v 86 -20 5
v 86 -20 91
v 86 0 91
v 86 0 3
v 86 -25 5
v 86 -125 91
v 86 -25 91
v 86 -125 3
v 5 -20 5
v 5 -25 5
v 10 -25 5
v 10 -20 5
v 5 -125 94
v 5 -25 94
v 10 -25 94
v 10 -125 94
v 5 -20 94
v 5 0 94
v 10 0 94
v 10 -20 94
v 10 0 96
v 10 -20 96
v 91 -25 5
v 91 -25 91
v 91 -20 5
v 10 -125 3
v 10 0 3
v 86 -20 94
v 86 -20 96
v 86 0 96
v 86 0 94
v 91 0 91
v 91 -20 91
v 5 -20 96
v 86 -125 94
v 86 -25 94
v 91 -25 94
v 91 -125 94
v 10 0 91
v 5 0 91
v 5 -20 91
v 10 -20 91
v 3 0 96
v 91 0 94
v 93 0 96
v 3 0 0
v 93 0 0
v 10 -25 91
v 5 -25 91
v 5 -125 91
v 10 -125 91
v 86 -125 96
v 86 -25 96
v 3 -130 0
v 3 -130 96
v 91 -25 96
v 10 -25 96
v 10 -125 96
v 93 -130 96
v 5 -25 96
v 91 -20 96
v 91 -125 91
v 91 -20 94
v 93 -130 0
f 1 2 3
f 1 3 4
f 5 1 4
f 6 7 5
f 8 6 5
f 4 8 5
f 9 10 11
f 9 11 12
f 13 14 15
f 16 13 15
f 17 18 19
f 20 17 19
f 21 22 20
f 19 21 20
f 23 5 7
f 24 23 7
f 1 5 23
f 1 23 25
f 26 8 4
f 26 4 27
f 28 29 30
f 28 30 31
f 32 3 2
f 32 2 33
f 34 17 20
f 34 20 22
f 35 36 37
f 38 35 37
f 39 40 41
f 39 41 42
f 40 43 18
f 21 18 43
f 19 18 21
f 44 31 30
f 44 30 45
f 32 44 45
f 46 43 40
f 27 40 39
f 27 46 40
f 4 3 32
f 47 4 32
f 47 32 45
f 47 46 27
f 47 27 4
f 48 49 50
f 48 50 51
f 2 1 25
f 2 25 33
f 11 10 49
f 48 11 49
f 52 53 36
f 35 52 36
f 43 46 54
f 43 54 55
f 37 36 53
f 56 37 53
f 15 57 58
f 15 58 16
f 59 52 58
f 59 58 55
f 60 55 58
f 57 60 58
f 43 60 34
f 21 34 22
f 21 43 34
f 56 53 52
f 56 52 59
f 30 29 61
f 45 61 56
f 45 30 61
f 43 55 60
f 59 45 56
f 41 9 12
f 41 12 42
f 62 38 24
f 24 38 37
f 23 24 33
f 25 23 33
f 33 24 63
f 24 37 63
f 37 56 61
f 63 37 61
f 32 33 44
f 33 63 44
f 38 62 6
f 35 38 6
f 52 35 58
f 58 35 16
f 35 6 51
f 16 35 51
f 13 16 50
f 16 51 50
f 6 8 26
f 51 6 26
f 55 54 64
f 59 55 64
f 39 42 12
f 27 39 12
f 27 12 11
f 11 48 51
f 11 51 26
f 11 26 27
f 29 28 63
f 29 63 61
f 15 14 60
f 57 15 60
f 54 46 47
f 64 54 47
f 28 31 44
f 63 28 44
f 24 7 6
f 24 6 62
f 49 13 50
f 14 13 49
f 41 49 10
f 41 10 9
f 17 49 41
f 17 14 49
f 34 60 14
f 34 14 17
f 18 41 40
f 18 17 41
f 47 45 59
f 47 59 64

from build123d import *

# Parameters (mm, degrees)
SKETCH_1_W           = 96
SKETCH_1_H           = 130
EXTRUDE_1_DEPTH      = 96
SKETCH_3_W           = 76
SKETCH_3_H           = 93
CUT_EXTRUDE_1_DEPTH  = 130
SKETCH_8_W           = 86
SKETCH_8_H           = 125
CUT_EXTRUDE_5_DEPTH  = 3
SKETCH_10_W          = 91
SKETCH_10_H          = 5
CUT_EXTRUDE_7_DEPTH  = 86
SKETCH_15_W          = 96
SKETCH_15_H          = 130
CUT_EXTRUDE_10_DEPTH = 3
SKETCH_16_W          = 96
SKETCH_16_H          = 130
CUT_EXTRUDE_11_DEPTH = 3


with BuildPart() as part:
    # 草圖1 → 填料-伸長1 (new body)
    with BuildSketch(Plane.XY):
        with Locations((48, -65)):
            Rectangle(SKETCH_1_W, SKETCH_1_H)
    extrude(amount=EXTRUDE_1_DEPTH)

    # 草圖3 → 除料-伸長1 (cut)
    with BuildSketch(Plane(origin=(0, -125, 0), x_dir=(-1, 0, 0), z_dir=(0, -1, 0))):
        with Locations((-48, -49.5)):
            Rectangle(SKETCH_3_W, SKETCH_3_H)
    extrude(amount=-CUT_EXTRUDE_1_DEPTH, mode=Mode.SUBTRACT)

    # 草圖8 → 除料-伸長5 (cut)
    with BuildSketch(Plane.XY.offset(94)):
        with Locations((48, -62.5)):
            Rectangle(SKETCH_8_W, SKETCH_8_H)
    extrude(amount=-CUT_EXTRUDE_5_DEPTH, mode=Mode.SUBTRACT)

    # 草圖10 → 除料-伸長7 (cut)
    with BuildSketch(Plane.ZY.offset(-5)):
        with Locations((50.5, -22.5)):
            Rectangle(SKETCH_10_W, SKETCH_10_H)
    extrude(amount=-CUT_EXTRUDE_7_DEPTH, mode=Mode.SUBTRACT)

    # 草圖15 → 除料-伸長10 (cut)
    with BuildSketch(Plane.ZY):
        with Locations((48, -65)):
            Rectangle(SKETCH_15_W, SKETCH_15_H)
    extrude(amount=-CUT_EXTRUDE_10_DEPTH, mode=Mode.SUBTRACT)

    # 草圖16 → 除料-伸長11 (cut)
    with BuildSketch(Plane(origin=(96, 0, 0), x_dir=(0, 0, -1), z_dir=(1, 0, 0))):
        with Locations((-48, -65)):
            Rectangle(SKETCH_16_W, SKETCH_16_H)
    extrude(amount=-CUT_EXTRUDE_11_DEPTH, mode=Mode.SUBTRACT)


solid = part.part
